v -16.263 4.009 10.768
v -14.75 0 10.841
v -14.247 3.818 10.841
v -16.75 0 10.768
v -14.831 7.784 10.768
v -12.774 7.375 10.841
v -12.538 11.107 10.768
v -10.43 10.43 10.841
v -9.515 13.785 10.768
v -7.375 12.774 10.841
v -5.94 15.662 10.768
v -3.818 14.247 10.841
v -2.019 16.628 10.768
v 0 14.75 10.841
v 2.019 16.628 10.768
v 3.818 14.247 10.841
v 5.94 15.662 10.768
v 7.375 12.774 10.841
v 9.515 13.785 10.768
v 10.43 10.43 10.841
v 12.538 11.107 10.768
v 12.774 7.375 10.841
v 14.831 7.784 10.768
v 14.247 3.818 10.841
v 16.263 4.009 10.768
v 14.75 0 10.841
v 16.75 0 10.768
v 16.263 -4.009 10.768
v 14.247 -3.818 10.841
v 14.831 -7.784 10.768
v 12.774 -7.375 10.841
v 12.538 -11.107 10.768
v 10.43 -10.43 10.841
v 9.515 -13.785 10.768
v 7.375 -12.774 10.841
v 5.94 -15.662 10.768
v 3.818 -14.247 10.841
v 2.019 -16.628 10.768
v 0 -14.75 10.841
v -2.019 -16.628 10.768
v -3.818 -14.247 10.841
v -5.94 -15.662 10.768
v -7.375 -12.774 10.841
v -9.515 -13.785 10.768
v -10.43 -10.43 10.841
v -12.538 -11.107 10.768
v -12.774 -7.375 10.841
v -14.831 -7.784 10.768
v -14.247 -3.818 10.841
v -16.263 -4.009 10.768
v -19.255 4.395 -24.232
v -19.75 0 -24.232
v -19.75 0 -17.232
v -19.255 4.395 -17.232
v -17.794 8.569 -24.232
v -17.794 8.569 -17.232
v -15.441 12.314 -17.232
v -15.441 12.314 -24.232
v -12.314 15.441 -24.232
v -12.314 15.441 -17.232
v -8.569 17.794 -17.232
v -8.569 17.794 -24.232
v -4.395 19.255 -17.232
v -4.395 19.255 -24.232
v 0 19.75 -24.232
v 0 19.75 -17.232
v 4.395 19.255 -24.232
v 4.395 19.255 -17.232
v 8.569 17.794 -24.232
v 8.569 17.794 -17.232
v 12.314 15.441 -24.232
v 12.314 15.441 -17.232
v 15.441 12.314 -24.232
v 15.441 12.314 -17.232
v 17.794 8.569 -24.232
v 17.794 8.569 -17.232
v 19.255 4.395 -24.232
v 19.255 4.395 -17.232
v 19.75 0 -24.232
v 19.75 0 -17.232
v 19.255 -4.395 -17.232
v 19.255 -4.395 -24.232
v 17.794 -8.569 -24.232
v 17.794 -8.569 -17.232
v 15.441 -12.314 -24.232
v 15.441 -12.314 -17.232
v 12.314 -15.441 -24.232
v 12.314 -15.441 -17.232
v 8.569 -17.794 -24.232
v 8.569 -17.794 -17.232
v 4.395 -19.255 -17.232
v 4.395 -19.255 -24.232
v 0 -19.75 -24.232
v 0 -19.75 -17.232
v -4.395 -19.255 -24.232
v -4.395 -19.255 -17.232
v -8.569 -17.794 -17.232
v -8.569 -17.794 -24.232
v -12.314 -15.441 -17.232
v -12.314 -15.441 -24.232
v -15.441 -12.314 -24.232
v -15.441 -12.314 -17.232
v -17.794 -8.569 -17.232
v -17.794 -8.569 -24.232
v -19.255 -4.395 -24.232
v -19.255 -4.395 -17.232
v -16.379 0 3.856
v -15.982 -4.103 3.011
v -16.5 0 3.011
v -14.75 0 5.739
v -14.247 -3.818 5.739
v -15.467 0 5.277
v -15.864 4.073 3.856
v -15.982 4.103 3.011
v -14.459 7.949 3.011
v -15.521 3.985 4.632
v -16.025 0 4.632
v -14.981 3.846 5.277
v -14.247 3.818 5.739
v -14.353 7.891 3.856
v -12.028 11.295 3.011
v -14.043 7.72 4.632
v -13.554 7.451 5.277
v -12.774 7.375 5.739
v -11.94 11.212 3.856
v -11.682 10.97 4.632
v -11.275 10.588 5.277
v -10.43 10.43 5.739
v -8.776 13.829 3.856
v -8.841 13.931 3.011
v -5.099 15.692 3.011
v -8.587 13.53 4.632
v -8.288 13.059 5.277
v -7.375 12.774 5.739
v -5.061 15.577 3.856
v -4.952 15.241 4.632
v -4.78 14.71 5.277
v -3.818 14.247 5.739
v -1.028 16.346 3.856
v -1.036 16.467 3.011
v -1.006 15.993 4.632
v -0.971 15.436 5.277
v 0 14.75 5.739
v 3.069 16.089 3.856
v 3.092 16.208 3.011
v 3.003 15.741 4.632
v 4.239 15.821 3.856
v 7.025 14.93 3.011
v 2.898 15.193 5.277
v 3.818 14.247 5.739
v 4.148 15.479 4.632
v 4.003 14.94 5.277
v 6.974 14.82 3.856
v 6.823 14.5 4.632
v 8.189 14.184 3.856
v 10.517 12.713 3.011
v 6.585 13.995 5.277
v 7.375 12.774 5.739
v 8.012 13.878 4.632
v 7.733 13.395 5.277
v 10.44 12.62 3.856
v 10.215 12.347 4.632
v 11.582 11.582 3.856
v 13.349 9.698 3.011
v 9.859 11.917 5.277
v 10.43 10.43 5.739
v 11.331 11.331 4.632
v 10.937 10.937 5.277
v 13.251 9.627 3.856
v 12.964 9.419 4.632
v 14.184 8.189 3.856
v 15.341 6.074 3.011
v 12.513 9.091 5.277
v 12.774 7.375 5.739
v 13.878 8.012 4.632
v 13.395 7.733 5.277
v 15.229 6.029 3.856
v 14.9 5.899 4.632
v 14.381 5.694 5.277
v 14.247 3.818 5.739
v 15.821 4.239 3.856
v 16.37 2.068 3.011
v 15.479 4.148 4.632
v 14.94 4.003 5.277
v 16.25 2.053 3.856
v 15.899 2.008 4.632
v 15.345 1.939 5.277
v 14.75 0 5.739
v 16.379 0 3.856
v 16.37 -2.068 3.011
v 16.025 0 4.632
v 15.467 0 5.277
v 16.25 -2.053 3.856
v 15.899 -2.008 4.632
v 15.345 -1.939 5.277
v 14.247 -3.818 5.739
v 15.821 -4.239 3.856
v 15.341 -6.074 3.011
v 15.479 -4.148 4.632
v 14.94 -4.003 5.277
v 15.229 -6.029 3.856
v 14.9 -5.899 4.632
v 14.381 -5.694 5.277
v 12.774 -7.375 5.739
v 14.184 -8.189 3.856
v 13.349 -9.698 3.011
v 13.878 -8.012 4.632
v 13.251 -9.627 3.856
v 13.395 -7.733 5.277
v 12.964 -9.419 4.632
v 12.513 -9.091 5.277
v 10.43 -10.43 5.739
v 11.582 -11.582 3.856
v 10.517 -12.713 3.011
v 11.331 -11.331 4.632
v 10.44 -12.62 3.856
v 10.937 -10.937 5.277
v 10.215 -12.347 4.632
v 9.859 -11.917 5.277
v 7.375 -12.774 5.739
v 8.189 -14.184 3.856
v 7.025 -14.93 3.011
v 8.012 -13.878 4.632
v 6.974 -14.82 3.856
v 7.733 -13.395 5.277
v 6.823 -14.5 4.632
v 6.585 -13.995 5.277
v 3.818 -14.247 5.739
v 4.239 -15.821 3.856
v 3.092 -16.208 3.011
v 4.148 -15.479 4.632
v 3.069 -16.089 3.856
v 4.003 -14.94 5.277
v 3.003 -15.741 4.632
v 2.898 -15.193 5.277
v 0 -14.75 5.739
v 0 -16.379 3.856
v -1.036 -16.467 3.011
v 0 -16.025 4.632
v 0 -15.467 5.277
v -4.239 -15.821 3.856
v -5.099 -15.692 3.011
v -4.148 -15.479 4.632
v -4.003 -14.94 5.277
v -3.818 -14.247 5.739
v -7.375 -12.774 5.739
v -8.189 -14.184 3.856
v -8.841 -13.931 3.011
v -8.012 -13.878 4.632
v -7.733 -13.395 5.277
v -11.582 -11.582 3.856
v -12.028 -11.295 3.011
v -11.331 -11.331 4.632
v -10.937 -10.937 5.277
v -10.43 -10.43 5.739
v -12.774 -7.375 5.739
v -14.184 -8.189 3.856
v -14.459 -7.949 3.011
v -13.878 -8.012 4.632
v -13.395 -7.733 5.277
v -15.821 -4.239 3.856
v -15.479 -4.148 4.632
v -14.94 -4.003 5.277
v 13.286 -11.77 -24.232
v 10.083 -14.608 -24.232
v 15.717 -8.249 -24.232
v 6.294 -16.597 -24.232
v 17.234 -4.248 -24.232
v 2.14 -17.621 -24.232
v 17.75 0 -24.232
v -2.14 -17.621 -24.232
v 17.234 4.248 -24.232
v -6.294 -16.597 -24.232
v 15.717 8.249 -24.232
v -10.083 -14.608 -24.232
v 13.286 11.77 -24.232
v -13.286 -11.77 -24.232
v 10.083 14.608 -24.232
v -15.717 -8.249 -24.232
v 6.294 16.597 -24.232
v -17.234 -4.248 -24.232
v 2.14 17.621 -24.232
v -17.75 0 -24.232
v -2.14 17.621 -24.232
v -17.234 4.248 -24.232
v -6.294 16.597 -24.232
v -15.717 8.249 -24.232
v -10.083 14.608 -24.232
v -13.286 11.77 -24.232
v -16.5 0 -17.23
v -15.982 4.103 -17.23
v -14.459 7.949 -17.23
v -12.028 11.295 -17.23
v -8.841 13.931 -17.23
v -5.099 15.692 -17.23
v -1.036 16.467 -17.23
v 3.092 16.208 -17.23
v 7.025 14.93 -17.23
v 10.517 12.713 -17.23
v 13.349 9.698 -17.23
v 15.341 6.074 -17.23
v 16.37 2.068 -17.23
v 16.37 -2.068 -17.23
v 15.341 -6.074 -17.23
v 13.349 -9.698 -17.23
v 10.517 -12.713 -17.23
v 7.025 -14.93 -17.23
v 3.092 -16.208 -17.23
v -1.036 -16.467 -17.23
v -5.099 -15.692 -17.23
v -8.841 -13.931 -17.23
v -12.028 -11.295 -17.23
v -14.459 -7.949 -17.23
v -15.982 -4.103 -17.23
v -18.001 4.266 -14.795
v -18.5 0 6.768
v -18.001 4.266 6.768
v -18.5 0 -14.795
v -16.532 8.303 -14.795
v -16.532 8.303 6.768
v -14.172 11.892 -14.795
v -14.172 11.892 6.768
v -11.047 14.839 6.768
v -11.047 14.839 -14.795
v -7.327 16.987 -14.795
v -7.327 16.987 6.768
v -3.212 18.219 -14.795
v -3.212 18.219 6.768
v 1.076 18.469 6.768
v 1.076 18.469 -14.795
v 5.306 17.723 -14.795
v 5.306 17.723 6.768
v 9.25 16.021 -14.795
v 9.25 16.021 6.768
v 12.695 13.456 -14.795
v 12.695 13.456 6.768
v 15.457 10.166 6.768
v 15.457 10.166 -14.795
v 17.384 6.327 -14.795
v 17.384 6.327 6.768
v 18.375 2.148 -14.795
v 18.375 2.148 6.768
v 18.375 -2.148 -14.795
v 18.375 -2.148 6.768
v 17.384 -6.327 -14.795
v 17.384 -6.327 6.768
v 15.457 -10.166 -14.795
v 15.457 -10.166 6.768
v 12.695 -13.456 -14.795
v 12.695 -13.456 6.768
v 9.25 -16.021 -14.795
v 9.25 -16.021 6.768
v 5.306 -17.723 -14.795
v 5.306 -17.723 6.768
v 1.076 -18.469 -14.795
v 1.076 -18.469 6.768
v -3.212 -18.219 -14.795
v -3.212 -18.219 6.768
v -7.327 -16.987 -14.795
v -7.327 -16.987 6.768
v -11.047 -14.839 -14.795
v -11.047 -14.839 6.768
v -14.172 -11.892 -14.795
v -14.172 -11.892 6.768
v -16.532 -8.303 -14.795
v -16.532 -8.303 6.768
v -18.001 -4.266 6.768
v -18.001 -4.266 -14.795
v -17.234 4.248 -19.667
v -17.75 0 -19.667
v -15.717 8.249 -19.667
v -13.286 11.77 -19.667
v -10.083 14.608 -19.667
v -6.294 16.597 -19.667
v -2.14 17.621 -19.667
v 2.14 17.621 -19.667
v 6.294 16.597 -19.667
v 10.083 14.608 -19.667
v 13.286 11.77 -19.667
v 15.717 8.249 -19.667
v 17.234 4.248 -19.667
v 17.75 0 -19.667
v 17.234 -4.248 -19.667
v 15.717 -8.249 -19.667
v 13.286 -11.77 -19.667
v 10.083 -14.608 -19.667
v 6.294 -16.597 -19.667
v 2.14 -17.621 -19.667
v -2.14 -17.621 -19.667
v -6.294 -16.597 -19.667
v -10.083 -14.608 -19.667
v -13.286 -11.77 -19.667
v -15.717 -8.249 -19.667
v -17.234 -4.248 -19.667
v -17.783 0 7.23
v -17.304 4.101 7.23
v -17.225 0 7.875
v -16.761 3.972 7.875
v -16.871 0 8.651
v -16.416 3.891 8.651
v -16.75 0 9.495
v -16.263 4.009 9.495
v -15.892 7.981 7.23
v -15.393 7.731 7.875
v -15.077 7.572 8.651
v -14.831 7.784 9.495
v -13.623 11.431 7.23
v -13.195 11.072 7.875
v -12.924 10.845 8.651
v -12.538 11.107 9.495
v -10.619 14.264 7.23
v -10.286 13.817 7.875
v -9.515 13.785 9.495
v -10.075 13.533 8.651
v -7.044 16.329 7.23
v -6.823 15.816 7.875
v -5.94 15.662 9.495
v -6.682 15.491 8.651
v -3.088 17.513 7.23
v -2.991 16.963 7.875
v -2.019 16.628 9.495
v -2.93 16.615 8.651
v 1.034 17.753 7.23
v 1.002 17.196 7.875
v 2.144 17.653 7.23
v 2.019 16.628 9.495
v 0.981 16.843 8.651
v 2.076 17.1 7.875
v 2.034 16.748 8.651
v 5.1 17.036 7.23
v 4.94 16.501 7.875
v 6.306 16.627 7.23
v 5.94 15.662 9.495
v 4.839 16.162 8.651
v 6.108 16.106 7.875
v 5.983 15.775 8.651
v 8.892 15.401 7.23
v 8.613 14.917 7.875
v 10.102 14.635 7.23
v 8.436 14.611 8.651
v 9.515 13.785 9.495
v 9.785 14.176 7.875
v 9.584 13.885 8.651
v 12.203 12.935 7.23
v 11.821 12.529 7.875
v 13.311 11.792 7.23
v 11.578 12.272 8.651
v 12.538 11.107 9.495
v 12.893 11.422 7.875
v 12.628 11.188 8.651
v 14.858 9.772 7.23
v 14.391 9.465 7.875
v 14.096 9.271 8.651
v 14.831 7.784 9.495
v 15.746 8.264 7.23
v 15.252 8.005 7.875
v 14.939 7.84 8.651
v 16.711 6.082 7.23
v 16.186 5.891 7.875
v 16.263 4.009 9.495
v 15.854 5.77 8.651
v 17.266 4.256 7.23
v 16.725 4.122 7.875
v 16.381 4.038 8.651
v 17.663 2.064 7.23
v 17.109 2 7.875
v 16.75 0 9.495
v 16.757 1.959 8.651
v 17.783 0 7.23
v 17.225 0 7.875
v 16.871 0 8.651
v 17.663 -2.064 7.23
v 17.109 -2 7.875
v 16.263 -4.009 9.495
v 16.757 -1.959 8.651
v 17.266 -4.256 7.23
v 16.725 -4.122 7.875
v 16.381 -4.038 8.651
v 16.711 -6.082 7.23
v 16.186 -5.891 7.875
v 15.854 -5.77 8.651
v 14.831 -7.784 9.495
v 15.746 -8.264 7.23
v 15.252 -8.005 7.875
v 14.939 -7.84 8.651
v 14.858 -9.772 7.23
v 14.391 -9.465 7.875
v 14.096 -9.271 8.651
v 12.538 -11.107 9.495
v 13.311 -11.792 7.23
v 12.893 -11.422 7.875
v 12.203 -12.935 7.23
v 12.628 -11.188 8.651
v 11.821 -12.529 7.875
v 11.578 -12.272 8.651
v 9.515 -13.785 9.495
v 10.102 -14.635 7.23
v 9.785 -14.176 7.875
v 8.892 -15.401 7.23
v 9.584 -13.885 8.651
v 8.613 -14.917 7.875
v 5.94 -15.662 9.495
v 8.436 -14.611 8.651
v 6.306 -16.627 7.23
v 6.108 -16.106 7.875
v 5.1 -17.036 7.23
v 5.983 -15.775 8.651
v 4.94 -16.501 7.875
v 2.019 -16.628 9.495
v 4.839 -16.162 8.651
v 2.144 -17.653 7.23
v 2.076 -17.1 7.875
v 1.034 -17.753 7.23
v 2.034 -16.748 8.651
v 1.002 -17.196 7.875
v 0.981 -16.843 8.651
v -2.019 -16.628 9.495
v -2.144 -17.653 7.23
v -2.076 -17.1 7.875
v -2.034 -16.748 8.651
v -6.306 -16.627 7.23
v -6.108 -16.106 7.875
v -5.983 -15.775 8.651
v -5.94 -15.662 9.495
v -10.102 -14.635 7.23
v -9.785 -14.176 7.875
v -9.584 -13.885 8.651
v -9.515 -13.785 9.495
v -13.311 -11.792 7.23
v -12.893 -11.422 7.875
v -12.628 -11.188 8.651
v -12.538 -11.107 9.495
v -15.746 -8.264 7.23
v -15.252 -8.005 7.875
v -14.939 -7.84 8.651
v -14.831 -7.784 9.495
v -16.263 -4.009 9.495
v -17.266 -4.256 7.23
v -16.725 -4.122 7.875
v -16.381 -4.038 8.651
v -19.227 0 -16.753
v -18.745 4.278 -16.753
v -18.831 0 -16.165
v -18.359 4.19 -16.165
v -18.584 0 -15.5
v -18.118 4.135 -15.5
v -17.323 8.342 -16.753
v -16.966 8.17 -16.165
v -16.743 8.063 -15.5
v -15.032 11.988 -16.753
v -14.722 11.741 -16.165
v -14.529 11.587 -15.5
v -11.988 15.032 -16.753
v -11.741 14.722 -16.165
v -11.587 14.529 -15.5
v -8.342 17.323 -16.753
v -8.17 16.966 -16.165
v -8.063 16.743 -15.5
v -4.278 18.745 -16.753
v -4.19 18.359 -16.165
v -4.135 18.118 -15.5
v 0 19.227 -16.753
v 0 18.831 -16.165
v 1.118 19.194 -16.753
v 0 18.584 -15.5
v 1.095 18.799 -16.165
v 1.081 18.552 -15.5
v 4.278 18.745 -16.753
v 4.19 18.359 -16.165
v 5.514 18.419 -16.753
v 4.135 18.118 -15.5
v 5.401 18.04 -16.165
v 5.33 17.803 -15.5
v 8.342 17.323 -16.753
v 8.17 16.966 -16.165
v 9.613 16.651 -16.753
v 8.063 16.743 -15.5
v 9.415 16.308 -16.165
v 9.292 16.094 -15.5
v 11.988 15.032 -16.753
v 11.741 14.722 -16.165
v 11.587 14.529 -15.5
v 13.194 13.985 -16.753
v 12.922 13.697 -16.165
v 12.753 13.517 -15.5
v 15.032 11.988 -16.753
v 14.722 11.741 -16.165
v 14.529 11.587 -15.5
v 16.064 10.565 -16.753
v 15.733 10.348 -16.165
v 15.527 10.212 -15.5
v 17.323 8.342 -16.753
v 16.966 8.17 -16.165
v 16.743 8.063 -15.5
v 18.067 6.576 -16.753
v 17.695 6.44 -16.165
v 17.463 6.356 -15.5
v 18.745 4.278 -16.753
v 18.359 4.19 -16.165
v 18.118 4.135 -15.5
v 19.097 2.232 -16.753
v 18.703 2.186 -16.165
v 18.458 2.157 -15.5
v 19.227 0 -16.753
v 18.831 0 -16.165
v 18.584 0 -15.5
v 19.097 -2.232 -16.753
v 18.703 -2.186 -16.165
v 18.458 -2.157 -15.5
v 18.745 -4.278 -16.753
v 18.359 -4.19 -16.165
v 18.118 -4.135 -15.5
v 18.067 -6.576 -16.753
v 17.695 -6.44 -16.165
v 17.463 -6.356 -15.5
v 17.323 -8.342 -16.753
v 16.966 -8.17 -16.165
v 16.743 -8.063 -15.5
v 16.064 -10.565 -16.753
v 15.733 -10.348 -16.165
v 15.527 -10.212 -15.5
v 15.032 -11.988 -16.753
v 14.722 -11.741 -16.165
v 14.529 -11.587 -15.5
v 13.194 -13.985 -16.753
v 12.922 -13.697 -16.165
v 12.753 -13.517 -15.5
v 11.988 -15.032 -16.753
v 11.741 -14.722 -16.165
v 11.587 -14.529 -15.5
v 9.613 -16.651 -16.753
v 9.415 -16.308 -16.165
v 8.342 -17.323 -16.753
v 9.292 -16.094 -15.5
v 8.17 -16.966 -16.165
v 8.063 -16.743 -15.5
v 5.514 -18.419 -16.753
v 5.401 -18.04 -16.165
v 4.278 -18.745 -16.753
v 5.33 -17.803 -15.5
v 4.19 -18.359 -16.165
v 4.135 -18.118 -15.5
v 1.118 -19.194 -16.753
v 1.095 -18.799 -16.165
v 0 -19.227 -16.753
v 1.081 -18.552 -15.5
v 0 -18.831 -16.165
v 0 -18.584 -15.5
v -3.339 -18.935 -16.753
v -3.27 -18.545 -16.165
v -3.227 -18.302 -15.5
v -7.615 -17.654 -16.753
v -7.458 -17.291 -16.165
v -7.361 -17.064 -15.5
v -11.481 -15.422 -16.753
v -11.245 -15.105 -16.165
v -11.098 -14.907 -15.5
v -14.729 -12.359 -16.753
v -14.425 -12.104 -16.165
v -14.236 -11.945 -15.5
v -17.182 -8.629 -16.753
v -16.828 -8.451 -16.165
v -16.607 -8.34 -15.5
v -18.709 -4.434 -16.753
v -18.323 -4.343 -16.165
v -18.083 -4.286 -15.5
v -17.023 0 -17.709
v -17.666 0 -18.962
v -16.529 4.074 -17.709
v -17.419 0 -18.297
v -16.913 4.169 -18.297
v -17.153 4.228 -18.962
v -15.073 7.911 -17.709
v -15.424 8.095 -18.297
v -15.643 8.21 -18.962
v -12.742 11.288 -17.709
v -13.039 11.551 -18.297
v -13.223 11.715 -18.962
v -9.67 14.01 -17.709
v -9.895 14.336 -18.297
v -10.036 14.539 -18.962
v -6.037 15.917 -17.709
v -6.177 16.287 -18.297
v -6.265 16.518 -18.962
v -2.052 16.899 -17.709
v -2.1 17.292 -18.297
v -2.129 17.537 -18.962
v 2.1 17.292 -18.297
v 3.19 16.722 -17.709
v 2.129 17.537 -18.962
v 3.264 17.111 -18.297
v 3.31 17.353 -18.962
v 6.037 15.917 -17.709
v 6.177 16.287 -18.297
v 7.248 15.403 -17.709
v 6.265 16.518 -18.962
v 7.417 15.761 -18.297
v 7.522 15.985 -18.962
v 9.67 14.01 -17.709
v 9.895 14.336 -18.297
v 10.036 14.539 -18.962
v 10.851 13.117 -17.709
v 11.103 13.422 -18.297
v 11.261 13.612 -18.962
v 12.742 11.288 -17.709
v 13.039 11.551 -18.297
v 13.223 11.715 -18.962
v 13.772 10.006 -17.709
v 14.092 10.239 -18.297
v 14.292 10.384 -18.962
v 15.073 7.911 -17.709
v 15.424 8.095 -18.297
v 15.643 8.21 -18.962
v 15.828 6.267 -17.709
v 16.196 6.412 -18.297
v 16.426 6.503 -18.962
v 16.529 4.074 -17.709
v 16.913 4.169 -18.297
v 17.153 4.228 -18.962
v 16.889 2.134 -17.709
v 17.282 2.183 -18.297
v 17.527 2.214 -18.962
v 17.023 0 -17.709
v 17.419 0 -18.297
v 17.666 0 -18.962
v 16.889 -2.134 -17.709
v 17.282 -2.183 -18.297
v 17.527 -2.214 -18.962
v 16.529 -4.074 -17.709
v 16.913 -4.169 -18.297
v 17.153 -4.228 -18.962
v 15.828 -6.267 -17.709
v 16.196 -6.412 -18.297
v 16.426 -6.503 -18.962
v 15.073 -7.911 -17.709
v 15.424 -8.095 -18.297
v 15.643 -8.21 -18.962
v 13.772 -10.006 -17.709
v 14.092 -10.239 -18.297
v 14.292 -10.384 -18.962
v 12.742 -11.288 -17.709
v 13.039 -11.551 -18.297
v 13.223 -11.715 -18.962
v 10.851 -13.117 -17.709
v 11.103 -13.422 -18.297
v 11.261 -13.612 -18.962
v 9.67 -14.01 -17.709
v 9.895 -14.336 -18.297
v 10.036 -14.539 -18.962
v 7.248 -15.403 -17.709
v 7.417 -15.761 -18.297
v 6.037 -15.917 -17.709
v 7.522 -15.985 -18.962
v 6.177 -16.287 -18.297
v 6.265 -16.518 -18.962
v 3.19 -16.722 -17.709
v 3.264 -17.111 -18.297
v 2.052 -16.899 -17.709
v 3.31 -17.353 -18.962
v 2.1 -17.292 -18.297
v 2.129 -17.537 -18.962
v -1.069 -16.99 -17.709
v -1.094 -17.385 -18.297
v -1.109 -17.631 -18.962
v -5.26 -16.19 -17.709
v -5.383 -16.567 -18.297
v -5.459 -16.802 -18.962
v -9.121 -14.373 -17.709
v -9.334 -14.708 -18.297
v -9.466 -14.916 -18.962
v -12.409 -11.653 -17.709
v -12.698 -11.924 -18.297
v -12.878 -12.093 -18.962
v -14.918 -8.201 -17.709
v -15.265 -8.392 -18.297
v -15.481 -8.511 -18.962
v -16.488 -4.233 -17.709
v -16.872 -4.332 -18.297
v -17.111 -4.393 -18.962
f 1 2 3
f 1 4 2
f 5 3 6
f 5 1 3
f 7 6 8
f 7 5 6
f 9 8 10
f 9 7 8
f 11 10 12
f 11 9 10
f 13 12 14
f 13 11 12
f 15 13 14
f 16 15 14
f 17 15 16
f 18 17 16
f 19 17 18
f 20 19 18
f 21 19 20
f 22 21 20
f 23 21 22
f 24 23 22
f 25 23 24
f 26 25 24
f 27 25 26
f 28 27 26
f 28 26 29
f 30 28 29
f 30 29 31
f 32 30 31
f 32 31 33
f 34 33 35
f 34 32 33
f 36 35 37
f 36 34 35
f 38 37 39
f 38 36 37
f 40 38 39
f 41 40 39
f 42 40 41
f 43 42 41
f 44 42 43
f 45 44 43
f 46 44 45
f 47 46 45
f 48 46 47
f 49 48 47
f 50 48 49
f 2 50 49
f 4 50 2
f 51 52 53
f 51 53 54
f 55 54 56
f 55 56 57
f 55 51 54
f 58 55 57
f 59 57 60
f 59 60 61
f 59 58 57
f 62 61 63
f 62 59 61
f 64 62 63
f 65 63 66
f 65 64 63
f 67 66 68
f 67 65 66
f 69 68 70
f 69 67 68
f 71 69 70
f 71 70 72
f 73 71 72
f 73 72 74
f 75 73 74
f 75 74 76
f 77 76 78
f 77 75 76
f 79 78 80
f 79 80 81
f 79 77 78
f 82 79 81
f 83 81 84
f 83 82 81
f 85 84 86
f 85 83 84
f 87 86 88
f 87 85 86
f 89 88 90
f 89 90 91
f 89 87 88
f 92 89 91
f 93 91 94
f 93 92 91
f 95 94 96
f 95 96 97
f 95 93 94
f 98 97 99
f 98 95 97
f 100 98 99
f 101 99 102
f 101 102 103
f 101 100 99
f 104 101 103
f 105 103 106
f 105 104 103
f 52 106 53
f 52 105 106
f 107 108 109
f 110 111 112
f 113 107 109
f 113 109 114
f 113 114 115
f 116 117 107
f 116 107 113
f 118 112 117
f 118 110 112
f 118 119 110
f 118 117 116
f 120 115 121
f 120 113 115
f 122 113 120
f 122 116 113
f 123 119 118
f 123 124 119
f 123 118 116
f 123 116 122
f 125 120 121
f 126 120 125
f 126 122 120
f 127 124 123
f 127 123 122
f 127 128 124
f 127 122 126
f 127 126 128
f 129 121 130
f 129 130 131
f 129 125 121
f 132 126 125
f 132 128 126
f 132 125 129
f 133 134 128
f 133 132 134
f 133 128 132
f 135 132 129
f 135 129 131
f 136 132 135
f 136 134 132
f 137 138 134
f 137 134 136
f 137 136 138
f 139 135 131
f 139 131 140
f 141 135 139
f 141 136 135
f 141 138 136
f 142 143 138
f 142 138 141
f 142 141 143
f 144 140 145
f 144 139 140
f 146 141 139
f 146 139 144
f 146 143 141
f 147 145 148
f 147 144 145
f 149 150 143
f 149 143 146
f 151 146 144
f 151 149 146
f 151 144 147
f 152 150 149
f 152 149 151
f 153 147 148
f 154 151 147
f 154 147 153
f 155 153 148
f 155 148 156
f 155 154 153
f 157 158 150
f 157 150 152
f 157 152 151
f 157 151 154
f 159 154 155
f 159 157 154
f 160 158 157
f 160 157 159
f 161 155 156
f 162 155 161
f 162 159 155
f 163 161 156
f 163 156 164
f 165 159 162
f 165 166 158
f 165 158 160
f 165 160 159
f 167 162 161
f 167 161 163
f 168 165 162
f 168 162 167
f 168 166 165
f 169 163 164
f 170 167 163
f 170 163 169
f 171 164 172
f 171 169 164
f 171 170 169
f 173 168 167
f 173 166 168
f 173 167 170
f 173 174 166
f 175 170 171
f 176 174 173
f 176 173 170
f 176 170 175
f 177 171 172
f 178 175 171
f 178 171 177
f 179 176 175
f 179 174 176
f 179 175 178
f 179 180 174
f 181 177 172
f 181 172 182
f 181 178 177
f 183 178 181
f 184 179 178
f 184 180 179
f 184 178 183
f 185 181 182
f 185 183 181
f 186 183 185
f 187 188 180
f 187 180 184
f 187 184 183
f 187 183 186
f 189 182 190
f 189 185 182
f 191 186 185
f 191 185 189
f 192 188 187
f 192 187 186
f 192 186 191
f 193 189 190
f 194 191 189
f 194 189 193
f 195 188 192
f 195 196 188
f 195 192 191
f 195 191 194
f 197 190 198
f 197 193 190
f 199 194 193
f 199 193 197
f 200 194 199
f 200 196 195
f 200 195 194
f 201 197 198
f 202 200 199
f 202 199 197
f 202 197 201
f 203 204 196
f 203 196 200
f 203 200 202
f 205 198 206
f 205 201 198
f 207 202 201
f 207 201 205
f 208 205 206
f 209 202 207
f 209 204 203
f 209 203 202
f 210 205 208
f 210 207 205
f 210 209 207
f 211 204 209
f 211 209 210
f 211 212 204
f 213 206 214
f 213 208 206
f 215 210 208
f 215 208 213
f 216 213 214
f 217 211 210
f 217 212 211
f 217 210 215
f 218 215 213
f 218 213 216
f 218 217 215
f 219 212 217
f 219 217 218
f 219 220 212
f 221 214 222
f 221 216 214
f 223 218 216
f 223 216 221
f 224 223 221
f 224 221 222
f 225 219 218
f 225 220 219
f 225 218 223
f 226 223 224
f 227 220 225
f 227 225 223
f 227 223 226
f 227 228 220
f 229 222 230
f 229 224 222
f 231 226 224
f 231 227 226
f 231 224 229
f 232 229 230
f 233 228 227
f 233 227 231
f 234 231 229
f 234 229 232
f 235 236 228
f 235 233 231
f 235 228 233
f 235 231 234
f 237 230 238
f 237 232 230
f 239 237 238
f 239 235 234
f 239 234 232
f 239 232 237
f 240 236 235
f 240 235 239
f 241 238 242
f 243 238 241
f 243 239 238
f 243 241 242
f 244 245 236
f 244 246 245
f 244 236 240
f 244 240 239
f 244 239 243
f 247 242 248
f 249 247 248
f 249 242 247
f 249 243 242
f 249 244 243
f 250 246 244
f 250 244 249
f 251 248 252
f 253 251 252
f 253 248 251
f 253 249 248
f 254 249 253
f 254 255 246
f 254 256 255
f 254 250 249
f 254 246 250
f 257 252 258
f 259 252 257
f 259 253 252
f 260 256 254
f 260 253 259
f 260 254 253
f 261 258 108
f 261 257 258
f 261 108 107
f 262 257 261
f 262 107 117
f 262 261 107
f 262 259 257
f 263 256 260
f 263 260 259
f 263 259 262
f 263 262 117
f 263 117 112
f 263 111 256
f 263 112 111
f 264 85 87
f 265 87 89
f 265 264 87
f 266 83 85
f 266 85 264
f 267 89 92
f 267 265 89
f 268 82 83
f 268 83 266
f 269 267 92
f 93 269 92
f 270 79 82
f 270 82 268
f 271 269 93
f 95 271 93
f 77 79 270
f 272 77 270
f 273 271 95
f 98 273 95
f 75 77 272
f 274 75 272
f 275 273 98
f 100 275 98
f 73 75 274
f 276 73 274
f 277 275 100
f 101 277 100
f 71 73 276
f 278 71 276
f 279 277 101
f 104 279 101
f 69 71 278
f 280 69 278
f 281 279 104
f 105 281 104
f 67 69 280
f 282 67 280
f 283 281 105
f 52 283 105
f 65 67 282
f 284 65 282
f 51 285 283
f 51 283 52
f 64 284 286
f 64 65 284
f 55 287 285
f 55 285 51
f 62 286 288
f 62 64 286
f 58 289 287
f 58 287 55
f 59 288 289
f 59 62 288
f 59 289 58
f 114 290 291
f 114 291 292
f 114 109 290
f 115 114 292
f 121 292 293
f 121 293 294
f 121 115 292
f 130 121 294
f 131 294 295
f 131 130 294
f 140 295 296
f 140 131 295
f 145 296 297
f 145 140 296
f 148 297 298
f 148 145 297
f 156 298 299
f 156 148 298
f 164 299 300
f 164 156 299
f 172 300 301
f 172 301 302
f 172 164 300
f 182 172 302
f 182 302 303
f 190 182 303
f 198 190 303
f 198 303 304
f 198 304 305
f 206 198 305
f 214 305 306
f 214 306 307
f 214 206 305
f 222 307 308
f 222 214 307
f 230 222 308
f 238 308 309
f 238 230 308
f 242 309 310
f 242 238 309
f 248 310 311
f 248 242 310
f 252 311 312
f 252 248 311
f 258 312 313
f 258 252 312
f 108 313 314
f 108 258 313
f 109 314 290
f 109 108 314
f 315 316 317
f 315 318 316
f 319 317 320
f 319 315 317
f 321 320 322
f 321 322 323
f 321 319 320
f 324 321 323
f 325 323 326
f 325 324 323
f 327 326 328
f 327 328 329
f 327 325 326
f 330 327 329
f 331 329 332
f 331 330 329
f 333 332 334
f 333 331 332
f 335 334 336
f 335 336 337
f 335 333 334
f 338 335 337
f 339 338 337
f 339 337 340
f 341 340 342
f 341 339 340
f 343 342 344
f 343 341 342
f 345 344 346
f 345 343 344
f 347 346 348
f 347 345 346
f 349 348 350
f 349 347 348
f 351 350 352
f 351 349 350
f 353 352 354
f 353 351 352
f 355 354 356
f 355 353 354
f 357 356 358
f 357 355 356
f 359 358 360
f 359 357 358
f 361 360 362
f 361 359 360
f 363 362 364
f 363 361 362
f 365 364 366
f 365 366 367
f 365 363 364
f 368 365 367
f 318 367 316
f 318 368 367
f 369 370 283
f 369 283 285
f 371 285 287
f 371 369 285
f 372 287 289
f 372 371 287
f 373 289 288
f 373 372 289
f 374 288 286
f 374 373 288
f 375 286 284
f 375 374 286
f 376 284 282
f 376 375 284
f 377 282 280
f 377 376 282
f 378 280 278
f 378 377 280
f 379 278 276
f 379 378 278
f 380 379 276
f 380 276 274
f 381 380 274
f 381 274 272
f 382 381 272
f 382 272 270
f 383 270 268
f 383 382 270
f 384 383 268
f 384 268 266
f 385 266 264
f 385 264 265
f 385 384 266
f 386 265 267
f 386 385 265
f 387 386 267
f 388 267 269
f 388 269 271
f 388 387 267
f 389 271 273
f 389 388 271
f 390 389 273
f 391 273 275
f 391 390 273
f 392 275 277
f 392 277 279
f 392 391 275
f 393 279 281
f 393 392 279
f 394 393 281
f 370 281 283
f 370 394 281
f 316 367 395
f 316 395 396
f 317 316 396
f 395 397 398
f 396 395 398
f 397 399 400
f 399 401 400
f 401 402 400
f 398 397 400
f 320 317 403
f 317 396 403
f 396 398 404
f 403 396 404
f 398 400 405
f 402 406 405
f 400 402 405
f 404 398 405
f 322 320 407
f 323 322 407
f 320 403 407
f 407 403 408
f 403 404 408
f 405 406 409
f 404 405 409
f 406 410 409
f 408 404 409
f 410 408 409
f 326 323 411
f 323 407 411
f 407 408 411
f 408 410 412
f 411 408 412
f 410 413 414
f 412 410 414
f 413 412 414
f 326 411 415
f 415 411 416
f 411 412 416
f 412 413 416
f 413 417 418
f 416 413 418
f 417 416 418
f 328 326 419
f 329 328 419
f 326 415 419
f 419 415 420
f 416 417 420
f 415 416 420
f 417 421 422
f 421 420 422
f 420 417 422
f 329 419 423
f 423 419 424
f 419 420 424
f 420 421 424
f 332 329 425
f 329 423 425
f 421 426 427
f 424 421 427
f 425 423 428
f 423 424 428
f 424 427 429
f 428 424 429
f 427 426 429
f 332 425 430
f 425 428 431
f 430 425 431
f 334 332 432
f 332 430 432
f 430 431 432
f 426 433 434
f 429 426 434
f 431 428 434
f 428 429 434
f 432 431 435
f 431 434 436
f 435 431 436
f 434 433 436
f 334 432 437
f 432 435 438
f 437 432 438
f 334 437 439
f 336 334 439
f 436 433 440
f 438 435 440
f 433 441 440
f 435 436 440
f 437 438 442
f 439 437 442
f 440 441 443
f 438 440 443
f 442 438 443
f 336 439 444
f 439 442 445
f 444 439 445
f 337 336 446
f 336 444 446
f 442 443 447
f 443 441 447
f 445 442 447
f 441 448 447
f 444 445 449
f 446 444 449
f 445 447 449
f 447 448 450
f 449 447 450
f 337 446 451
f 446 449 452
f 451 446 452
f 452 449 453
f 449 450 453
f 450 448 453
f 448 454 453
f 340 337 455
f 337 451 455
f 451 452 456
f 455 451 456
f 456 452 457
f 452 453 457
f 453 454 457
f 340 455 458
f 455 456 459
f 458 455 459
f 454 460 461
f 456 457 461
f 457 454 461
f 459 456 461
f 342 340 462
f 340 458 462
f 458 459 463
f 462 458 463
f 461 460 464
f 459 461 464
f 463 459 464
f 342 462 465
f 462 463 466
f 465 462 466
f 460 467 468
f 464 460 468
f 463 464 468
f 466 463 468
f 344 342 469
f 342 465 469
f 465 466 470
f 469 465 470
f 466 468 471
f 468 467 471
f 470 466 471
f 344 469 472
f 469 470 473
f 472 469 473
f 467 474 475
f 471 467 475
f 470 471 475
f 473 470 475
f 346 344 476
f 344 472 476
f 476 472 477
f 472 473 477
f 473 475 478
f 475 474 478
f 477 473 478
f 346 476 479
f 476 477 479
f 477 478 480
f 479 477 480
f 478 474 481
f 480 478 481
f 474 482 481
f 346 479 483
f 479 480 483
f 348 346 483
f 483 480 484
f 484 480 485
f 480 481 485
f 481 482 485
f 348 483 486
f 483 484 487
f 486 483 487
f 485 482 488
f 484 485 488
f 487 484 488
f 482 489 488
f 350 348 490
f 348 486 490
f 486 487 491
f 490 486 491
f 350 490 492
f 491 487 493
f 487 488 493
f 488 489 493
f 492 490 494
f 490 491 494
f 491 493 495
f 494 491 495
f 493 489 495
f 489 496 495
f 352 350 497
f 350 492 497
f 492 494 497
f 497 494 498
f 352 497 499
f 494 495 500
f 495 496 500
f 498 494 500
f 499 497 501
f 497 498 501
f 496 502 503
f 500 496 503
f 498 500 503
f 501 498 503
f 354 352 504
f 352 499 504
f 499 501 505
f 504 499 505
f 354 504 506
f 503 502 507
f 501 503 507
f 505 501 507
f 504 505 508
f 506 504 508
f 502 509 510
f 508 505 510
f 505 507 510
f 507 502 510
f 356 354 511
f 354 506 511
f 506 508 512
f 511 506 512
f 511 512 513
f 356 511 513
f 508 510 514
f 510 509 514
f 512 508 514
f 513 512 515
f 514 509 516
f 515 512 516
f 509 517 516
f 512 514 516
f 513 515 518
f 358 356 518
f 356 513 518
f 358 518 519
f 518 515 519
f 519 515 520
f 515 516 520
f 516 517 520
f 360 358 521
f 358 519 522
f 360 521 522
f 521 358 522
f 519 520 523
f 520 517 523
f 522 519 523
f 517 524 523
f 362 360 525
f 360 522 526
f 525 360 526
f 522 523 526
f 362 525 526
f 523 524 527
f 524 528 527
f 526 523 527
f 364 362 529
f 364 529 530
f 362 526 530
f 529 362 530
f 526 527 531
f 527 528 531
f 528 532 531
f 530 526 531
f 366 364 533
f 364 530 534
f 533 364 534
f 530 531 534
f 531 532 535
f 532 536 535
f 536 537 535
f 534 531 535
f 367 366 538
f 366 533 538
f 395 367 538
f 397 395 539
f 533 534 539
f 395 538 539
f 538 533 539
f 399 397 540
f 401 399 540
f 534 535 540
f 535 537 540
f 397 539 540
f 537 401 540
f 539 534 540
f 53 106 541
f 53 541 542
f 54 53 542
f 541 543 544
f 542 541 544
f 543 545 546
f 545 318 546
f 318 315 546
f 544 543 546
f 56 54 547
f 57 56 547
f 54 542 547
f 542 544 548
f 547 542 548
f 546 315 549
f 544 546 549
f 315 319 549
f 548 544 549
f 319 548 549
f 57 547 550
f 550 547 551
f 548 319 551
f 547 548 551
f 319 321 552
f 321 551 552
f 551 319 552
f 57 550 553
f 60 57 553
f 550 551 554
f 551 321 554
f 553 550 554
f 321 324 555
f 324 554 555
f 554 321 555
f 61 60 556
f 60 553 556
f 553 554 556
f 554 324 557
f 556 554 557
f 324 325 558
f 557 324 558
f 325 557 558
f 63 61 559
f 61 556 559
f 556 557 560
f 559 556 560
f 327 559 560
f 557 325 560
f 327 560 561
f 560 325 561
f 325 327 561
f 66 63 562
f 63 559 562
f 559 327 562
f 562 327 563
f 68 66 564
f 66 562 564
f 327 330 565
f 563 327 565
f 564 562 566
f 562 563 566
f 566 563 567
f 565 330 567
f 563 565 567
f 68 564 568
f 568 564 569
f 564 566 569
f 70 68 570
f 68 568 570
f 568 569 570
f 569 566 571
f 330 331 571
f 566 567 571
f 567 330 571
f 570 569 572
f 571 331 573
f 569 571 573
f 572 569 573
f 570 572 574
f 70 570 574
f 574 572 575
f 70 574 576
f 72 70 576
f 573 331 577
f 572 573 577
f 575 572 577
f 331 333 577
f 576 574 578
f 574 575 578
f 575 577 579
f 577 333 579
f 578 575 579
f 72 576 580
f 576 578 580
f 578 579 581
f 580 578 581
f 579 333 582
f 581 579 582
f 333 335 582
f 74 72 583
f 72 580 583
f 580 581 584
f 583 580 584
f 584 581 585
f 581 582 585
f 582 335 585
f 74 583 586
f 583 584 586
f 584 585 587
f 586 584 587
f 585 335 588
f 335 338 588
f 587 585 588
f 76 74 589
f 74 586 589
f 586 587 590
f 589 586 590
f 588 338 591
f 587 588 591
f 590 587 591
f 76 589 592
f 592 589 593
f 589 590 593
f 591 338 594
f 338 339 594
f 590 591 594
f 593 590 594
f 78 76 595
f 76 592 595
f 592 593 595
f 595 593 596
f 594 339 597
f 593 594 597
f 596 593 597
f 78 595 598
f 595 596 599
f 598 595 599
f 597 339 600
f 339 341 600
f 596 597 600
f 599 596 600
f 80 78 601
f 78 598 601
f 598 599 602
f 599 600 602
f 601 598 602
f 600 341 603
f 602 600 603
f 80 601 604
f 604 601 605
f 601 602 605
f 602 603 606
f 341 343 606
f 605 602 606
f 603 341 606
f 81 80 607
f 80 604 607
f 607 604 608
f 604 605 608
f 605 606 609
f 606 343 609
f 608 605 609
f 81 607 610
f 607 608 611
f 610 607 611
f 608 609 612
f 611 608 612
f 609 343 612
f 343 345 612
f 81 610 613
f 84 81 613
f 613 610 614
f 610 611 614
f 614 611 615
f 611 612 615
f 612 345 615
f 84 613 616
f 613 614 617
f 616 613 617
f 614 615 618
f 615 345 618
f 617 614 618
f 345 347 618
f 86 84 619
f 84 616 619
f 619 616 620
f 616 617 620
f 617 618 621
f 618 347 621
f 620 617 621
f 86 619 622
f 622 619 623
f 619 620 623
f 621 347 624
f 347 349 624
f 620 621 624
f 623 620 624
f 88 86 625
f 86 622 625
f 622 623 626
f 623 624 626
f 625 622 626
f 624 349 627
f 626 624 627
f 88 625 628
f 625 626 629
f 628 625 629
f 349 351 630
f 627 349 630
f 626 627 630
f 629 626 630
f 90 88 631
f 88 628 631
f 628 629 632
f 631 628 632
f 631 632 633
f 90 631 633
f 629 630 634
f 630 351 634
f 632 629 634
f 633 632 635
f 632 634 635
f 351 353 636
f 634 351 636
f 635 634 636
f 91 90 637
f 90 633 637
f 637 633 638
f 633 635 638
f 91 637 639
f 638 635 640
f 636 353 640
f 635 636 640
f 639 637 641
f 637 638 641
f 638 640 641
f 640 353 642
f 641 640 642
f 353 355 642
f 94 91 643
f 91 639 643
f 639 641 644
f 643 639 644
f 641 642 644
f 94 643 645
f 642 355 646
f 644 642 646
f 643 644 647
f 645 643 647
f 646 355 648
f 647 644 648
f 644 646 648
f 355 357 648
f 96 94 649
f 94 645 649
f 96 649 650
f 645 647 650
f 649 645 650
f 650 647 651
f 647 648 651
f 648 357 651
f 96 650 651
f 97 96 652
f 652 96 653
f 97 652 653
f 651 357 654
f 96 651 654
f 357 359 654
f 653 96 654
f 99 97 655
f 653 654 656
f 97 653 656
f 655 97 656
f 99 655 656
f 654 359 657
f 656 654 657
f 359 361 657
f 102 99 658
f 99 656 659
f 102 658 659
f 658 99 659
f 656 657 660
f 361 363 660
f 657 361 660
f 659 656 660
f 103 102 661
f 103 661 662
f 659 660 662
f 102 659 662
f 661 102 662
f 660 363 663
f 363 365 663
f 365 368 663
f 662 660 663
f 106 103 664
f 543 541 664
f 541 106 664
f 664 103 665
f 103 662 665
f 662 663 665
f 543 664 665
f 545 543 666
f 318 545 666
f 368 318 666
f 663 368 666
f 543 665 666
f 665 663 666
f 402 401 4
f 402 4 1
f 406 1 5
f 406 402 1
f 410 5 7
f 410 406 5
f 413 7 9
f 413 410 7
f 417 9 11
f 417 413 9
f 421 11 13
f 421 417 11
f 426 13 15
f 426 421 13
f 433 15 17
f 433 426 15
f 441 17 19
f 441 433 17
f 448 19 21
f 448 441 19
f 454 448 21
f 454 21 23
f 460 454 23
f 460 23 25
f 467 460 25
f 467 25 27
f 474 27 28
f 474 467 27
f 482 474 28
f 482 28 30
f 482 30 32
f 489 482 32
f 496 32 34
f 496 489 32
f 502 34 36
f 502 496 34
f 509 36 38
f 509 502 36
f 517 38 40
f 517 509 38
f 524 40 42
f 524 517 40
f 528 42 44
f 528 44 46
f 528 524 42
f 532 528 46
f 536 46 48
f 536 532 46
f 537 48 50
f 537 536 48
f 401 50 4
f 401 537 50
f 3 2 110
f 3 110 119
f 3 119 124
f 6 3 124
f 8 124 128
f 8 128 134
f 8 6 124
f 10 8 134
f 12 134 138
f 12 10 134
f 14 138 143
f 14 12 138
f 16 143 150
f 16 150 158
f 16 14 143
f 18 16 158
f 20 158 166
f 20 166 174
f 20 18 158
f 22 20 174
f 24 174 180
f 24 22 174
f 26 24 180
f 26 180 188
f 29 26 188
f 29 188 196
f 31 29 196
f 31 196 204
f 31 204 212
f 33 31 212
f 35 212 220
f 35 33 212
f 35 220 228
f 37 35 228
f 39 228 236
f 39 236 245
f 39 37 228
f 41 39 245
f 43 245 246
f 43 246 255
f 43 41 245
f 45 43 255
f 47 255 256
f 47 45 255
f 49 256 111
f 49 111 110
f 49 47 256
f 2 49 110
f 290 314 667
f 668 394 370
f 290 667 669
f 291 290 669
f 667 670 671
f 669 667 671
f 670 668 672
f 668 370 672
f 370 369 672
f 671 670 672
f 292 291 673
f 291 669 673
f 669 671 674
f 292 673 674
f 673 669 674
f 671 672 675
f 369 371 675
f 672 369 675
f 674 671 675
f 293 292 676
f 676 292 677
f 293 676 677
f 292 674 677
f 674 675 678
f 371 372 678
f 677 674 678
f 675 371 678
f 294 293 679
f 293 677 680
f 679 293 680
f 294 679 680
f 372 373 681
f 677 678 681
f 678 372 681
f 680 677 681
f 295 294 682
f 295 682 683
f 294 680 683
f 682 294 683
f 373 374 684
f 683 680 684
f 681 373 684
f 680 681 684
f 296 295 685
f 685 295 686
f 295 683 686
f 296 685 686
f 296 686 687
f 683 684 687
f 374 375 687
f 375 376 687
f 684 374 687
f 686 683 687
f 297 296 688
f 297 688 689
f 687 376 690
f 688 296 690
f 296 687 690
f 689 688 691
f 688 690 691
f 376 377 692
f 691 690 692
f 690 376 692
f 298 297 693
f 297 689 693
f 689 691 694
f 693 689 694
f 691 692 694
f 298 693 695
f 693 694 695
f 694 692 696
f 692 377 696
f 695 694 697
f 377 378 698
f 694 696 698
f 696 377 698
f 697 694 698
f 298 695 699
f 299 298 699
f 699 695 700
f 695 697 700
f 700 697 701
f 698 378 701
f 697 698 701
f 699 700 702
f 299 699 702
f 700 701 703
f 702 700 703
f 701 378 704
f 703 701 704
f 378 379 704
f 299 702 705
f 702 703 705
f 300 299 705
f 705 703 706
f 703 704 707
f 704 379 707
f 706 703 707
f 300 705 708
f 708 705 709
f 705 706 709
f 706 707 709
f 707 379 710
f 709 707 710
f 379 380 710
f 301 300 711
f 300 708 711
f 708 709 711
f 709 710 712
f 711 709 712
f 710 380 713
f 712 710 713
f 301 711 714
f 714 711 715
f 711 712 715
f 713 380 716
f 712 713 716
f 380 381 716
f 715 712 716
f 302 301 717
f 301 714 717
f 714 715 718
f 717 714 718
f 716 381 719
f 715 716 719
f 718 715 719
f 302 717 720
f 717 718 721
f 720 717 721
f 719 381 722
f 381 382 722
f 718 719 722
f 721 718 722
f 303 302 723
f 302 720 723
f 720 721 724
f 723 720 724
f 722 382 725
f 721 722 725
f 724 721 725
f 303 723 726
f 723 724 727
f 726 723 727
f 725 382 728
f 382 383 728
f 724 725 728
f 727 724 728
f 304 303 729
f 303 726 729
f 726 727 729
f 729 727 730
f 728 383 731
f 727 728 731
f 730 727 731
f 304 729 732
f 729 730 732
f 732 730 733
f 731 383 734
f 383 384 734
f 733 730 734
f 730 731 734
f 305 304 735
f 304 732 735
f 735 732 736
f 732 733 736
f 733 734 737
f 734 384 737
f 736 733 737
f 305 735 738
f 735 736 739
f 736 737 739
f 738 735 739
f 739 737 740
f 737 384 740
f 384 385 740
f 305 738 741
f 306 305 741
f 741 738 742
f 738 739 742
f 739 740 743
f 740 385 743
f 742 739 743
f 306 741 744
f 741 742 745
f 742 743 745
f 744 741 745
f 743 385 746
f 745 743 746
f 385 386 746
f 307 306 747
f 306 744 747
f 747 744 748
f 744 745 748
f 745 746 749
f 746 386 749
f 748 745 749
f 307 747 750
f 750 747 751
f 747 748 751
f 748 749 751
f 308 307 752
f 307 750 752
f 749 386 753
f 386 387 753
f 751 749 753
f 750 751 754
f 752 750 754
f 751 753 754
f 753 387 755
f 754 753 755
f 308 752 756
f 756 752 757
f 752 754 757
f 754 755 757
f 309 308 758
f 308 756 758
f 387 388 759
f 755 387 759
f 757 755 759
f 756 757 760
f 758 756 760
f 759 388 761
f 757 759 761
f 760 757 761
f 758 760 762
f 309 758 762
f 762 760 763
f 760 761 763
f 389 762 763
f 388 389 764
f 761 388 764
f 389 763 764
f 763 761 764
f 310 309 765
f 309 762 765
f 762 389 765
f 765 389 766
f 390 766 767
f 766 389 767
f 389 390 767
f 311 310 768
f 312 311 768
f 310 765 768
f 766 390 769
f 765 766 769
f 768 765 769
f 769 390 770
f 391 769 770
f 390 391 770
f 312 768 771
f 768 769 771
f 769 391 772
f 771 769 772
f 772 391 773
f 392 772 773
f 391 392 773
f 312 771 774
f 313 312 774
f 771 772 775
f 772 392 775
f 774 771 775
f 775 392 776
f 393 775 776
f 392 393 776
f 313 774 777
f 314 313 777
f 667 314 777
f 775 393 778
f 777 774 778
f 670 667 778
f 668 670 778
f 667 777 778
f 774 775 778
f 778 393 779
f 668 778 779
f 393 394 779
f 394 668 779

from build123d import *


# Not quite as in the source:
# - a fillet or chamfer that OpenCascade refuses, or shapes differently, is made with other operations: its cross-section is extruded or revolved along the edge and cut away or added


with BuildPart() as f1:
    # F0 (on Front) → F1 (revolve)
    with BuildSketch(Plane.XZ):
        Polygon((-16.5, 0), (-16.5, 5.7386059155), (-14.75, 5.7386059155), (-14.75, 10.8408229426), (-16.75, 10.7678563523), (-16.75, 6.7678563523), (-18.5, 6.7678563523), (-18.5, -17.2321436477), (-19.75, -17.2321436477), (-19.75, -24.2321436477), (-17.75, -24.2321436477), (-17.75, -17.2321436477), (-16.5, -17.2300804406), align=None)
    revolve(axis=Axis((0, 0, -1.1706372043), (0, 0, -1)))

    # F2: fillet of radius 3 on 4 edges, made by hand

    # F2_s1 → F2_t2 (revolve)
    with BuildSketch(Plane.XZ):
        with BuildLine():
            ThreePointArc((-18.5, 6.7678563523), (-17.2251237654, 7.8748492064), (-16.75, 9.495034381))
            Line((-16.75, 9.495034381), (-16.75, 6.7678563523))
            Line((-16.75, 6.7678563523), (-18.5, 6.7678563523))
        make_face()
    revolve(axis=Axis((0, 0, 6.7678563523), (0, 0, -1)))

    # F2_s3 → F2_t4 (revolve)
    with BuildSketch(Plane.XZ):
        with BuildLine():
            ThreePointArc((-19.75, -17.2321436477), (-18.830730437, -16.1647514552), (-18.5, -14.7954450615))
            Line((-18.5, -14.7954450615), (-18.5, -17.2321436477))
            Line((-18.5, -17.2321436477), (-19.75, -17.2321436477))
        make_face()
    revolve(axis=Axis((0, 0, -17.2321436477), (0, 0, -1)))

    # F2_s5 → F2_t6 (revolve)
    with BuildSketch(Plane.XZ):
        with BuildLine():
            ThreePointArc((-16.5, -17.2300804406), (-17.419269563, -18.2974726331), (-17.75, -19.6667790268))
            Line((-17.75, -19.6667790268), (-17.75, -17.2321436477))
            Line((-17.75, -17.2321436477), (-16.5, -17.2300804406))
        make_face()
    revolve(axis=Axis((0, 0, -17.2321436477), (0, 0, -1)))

    # F2_s7 → F2_t8 (revolve)
    with BuildSketch(Plane.XZ):
        with BuildLine():
            ThreePointArc((-16.5, 3.0114278869), (-16.0248762346, 4.6316130615), (-14.75, 5.7386059155))
            Line((-14.75, 5.7386059155), (-16.5, 5.7386059155))
            Line((-16.5, 5.7386059155), (-16.5, 3.0114278869))
        make_face()
    revolve(axis=Axis((0, 0, 5.7386059155), (0, 0, -1)))


solid = f1.part
